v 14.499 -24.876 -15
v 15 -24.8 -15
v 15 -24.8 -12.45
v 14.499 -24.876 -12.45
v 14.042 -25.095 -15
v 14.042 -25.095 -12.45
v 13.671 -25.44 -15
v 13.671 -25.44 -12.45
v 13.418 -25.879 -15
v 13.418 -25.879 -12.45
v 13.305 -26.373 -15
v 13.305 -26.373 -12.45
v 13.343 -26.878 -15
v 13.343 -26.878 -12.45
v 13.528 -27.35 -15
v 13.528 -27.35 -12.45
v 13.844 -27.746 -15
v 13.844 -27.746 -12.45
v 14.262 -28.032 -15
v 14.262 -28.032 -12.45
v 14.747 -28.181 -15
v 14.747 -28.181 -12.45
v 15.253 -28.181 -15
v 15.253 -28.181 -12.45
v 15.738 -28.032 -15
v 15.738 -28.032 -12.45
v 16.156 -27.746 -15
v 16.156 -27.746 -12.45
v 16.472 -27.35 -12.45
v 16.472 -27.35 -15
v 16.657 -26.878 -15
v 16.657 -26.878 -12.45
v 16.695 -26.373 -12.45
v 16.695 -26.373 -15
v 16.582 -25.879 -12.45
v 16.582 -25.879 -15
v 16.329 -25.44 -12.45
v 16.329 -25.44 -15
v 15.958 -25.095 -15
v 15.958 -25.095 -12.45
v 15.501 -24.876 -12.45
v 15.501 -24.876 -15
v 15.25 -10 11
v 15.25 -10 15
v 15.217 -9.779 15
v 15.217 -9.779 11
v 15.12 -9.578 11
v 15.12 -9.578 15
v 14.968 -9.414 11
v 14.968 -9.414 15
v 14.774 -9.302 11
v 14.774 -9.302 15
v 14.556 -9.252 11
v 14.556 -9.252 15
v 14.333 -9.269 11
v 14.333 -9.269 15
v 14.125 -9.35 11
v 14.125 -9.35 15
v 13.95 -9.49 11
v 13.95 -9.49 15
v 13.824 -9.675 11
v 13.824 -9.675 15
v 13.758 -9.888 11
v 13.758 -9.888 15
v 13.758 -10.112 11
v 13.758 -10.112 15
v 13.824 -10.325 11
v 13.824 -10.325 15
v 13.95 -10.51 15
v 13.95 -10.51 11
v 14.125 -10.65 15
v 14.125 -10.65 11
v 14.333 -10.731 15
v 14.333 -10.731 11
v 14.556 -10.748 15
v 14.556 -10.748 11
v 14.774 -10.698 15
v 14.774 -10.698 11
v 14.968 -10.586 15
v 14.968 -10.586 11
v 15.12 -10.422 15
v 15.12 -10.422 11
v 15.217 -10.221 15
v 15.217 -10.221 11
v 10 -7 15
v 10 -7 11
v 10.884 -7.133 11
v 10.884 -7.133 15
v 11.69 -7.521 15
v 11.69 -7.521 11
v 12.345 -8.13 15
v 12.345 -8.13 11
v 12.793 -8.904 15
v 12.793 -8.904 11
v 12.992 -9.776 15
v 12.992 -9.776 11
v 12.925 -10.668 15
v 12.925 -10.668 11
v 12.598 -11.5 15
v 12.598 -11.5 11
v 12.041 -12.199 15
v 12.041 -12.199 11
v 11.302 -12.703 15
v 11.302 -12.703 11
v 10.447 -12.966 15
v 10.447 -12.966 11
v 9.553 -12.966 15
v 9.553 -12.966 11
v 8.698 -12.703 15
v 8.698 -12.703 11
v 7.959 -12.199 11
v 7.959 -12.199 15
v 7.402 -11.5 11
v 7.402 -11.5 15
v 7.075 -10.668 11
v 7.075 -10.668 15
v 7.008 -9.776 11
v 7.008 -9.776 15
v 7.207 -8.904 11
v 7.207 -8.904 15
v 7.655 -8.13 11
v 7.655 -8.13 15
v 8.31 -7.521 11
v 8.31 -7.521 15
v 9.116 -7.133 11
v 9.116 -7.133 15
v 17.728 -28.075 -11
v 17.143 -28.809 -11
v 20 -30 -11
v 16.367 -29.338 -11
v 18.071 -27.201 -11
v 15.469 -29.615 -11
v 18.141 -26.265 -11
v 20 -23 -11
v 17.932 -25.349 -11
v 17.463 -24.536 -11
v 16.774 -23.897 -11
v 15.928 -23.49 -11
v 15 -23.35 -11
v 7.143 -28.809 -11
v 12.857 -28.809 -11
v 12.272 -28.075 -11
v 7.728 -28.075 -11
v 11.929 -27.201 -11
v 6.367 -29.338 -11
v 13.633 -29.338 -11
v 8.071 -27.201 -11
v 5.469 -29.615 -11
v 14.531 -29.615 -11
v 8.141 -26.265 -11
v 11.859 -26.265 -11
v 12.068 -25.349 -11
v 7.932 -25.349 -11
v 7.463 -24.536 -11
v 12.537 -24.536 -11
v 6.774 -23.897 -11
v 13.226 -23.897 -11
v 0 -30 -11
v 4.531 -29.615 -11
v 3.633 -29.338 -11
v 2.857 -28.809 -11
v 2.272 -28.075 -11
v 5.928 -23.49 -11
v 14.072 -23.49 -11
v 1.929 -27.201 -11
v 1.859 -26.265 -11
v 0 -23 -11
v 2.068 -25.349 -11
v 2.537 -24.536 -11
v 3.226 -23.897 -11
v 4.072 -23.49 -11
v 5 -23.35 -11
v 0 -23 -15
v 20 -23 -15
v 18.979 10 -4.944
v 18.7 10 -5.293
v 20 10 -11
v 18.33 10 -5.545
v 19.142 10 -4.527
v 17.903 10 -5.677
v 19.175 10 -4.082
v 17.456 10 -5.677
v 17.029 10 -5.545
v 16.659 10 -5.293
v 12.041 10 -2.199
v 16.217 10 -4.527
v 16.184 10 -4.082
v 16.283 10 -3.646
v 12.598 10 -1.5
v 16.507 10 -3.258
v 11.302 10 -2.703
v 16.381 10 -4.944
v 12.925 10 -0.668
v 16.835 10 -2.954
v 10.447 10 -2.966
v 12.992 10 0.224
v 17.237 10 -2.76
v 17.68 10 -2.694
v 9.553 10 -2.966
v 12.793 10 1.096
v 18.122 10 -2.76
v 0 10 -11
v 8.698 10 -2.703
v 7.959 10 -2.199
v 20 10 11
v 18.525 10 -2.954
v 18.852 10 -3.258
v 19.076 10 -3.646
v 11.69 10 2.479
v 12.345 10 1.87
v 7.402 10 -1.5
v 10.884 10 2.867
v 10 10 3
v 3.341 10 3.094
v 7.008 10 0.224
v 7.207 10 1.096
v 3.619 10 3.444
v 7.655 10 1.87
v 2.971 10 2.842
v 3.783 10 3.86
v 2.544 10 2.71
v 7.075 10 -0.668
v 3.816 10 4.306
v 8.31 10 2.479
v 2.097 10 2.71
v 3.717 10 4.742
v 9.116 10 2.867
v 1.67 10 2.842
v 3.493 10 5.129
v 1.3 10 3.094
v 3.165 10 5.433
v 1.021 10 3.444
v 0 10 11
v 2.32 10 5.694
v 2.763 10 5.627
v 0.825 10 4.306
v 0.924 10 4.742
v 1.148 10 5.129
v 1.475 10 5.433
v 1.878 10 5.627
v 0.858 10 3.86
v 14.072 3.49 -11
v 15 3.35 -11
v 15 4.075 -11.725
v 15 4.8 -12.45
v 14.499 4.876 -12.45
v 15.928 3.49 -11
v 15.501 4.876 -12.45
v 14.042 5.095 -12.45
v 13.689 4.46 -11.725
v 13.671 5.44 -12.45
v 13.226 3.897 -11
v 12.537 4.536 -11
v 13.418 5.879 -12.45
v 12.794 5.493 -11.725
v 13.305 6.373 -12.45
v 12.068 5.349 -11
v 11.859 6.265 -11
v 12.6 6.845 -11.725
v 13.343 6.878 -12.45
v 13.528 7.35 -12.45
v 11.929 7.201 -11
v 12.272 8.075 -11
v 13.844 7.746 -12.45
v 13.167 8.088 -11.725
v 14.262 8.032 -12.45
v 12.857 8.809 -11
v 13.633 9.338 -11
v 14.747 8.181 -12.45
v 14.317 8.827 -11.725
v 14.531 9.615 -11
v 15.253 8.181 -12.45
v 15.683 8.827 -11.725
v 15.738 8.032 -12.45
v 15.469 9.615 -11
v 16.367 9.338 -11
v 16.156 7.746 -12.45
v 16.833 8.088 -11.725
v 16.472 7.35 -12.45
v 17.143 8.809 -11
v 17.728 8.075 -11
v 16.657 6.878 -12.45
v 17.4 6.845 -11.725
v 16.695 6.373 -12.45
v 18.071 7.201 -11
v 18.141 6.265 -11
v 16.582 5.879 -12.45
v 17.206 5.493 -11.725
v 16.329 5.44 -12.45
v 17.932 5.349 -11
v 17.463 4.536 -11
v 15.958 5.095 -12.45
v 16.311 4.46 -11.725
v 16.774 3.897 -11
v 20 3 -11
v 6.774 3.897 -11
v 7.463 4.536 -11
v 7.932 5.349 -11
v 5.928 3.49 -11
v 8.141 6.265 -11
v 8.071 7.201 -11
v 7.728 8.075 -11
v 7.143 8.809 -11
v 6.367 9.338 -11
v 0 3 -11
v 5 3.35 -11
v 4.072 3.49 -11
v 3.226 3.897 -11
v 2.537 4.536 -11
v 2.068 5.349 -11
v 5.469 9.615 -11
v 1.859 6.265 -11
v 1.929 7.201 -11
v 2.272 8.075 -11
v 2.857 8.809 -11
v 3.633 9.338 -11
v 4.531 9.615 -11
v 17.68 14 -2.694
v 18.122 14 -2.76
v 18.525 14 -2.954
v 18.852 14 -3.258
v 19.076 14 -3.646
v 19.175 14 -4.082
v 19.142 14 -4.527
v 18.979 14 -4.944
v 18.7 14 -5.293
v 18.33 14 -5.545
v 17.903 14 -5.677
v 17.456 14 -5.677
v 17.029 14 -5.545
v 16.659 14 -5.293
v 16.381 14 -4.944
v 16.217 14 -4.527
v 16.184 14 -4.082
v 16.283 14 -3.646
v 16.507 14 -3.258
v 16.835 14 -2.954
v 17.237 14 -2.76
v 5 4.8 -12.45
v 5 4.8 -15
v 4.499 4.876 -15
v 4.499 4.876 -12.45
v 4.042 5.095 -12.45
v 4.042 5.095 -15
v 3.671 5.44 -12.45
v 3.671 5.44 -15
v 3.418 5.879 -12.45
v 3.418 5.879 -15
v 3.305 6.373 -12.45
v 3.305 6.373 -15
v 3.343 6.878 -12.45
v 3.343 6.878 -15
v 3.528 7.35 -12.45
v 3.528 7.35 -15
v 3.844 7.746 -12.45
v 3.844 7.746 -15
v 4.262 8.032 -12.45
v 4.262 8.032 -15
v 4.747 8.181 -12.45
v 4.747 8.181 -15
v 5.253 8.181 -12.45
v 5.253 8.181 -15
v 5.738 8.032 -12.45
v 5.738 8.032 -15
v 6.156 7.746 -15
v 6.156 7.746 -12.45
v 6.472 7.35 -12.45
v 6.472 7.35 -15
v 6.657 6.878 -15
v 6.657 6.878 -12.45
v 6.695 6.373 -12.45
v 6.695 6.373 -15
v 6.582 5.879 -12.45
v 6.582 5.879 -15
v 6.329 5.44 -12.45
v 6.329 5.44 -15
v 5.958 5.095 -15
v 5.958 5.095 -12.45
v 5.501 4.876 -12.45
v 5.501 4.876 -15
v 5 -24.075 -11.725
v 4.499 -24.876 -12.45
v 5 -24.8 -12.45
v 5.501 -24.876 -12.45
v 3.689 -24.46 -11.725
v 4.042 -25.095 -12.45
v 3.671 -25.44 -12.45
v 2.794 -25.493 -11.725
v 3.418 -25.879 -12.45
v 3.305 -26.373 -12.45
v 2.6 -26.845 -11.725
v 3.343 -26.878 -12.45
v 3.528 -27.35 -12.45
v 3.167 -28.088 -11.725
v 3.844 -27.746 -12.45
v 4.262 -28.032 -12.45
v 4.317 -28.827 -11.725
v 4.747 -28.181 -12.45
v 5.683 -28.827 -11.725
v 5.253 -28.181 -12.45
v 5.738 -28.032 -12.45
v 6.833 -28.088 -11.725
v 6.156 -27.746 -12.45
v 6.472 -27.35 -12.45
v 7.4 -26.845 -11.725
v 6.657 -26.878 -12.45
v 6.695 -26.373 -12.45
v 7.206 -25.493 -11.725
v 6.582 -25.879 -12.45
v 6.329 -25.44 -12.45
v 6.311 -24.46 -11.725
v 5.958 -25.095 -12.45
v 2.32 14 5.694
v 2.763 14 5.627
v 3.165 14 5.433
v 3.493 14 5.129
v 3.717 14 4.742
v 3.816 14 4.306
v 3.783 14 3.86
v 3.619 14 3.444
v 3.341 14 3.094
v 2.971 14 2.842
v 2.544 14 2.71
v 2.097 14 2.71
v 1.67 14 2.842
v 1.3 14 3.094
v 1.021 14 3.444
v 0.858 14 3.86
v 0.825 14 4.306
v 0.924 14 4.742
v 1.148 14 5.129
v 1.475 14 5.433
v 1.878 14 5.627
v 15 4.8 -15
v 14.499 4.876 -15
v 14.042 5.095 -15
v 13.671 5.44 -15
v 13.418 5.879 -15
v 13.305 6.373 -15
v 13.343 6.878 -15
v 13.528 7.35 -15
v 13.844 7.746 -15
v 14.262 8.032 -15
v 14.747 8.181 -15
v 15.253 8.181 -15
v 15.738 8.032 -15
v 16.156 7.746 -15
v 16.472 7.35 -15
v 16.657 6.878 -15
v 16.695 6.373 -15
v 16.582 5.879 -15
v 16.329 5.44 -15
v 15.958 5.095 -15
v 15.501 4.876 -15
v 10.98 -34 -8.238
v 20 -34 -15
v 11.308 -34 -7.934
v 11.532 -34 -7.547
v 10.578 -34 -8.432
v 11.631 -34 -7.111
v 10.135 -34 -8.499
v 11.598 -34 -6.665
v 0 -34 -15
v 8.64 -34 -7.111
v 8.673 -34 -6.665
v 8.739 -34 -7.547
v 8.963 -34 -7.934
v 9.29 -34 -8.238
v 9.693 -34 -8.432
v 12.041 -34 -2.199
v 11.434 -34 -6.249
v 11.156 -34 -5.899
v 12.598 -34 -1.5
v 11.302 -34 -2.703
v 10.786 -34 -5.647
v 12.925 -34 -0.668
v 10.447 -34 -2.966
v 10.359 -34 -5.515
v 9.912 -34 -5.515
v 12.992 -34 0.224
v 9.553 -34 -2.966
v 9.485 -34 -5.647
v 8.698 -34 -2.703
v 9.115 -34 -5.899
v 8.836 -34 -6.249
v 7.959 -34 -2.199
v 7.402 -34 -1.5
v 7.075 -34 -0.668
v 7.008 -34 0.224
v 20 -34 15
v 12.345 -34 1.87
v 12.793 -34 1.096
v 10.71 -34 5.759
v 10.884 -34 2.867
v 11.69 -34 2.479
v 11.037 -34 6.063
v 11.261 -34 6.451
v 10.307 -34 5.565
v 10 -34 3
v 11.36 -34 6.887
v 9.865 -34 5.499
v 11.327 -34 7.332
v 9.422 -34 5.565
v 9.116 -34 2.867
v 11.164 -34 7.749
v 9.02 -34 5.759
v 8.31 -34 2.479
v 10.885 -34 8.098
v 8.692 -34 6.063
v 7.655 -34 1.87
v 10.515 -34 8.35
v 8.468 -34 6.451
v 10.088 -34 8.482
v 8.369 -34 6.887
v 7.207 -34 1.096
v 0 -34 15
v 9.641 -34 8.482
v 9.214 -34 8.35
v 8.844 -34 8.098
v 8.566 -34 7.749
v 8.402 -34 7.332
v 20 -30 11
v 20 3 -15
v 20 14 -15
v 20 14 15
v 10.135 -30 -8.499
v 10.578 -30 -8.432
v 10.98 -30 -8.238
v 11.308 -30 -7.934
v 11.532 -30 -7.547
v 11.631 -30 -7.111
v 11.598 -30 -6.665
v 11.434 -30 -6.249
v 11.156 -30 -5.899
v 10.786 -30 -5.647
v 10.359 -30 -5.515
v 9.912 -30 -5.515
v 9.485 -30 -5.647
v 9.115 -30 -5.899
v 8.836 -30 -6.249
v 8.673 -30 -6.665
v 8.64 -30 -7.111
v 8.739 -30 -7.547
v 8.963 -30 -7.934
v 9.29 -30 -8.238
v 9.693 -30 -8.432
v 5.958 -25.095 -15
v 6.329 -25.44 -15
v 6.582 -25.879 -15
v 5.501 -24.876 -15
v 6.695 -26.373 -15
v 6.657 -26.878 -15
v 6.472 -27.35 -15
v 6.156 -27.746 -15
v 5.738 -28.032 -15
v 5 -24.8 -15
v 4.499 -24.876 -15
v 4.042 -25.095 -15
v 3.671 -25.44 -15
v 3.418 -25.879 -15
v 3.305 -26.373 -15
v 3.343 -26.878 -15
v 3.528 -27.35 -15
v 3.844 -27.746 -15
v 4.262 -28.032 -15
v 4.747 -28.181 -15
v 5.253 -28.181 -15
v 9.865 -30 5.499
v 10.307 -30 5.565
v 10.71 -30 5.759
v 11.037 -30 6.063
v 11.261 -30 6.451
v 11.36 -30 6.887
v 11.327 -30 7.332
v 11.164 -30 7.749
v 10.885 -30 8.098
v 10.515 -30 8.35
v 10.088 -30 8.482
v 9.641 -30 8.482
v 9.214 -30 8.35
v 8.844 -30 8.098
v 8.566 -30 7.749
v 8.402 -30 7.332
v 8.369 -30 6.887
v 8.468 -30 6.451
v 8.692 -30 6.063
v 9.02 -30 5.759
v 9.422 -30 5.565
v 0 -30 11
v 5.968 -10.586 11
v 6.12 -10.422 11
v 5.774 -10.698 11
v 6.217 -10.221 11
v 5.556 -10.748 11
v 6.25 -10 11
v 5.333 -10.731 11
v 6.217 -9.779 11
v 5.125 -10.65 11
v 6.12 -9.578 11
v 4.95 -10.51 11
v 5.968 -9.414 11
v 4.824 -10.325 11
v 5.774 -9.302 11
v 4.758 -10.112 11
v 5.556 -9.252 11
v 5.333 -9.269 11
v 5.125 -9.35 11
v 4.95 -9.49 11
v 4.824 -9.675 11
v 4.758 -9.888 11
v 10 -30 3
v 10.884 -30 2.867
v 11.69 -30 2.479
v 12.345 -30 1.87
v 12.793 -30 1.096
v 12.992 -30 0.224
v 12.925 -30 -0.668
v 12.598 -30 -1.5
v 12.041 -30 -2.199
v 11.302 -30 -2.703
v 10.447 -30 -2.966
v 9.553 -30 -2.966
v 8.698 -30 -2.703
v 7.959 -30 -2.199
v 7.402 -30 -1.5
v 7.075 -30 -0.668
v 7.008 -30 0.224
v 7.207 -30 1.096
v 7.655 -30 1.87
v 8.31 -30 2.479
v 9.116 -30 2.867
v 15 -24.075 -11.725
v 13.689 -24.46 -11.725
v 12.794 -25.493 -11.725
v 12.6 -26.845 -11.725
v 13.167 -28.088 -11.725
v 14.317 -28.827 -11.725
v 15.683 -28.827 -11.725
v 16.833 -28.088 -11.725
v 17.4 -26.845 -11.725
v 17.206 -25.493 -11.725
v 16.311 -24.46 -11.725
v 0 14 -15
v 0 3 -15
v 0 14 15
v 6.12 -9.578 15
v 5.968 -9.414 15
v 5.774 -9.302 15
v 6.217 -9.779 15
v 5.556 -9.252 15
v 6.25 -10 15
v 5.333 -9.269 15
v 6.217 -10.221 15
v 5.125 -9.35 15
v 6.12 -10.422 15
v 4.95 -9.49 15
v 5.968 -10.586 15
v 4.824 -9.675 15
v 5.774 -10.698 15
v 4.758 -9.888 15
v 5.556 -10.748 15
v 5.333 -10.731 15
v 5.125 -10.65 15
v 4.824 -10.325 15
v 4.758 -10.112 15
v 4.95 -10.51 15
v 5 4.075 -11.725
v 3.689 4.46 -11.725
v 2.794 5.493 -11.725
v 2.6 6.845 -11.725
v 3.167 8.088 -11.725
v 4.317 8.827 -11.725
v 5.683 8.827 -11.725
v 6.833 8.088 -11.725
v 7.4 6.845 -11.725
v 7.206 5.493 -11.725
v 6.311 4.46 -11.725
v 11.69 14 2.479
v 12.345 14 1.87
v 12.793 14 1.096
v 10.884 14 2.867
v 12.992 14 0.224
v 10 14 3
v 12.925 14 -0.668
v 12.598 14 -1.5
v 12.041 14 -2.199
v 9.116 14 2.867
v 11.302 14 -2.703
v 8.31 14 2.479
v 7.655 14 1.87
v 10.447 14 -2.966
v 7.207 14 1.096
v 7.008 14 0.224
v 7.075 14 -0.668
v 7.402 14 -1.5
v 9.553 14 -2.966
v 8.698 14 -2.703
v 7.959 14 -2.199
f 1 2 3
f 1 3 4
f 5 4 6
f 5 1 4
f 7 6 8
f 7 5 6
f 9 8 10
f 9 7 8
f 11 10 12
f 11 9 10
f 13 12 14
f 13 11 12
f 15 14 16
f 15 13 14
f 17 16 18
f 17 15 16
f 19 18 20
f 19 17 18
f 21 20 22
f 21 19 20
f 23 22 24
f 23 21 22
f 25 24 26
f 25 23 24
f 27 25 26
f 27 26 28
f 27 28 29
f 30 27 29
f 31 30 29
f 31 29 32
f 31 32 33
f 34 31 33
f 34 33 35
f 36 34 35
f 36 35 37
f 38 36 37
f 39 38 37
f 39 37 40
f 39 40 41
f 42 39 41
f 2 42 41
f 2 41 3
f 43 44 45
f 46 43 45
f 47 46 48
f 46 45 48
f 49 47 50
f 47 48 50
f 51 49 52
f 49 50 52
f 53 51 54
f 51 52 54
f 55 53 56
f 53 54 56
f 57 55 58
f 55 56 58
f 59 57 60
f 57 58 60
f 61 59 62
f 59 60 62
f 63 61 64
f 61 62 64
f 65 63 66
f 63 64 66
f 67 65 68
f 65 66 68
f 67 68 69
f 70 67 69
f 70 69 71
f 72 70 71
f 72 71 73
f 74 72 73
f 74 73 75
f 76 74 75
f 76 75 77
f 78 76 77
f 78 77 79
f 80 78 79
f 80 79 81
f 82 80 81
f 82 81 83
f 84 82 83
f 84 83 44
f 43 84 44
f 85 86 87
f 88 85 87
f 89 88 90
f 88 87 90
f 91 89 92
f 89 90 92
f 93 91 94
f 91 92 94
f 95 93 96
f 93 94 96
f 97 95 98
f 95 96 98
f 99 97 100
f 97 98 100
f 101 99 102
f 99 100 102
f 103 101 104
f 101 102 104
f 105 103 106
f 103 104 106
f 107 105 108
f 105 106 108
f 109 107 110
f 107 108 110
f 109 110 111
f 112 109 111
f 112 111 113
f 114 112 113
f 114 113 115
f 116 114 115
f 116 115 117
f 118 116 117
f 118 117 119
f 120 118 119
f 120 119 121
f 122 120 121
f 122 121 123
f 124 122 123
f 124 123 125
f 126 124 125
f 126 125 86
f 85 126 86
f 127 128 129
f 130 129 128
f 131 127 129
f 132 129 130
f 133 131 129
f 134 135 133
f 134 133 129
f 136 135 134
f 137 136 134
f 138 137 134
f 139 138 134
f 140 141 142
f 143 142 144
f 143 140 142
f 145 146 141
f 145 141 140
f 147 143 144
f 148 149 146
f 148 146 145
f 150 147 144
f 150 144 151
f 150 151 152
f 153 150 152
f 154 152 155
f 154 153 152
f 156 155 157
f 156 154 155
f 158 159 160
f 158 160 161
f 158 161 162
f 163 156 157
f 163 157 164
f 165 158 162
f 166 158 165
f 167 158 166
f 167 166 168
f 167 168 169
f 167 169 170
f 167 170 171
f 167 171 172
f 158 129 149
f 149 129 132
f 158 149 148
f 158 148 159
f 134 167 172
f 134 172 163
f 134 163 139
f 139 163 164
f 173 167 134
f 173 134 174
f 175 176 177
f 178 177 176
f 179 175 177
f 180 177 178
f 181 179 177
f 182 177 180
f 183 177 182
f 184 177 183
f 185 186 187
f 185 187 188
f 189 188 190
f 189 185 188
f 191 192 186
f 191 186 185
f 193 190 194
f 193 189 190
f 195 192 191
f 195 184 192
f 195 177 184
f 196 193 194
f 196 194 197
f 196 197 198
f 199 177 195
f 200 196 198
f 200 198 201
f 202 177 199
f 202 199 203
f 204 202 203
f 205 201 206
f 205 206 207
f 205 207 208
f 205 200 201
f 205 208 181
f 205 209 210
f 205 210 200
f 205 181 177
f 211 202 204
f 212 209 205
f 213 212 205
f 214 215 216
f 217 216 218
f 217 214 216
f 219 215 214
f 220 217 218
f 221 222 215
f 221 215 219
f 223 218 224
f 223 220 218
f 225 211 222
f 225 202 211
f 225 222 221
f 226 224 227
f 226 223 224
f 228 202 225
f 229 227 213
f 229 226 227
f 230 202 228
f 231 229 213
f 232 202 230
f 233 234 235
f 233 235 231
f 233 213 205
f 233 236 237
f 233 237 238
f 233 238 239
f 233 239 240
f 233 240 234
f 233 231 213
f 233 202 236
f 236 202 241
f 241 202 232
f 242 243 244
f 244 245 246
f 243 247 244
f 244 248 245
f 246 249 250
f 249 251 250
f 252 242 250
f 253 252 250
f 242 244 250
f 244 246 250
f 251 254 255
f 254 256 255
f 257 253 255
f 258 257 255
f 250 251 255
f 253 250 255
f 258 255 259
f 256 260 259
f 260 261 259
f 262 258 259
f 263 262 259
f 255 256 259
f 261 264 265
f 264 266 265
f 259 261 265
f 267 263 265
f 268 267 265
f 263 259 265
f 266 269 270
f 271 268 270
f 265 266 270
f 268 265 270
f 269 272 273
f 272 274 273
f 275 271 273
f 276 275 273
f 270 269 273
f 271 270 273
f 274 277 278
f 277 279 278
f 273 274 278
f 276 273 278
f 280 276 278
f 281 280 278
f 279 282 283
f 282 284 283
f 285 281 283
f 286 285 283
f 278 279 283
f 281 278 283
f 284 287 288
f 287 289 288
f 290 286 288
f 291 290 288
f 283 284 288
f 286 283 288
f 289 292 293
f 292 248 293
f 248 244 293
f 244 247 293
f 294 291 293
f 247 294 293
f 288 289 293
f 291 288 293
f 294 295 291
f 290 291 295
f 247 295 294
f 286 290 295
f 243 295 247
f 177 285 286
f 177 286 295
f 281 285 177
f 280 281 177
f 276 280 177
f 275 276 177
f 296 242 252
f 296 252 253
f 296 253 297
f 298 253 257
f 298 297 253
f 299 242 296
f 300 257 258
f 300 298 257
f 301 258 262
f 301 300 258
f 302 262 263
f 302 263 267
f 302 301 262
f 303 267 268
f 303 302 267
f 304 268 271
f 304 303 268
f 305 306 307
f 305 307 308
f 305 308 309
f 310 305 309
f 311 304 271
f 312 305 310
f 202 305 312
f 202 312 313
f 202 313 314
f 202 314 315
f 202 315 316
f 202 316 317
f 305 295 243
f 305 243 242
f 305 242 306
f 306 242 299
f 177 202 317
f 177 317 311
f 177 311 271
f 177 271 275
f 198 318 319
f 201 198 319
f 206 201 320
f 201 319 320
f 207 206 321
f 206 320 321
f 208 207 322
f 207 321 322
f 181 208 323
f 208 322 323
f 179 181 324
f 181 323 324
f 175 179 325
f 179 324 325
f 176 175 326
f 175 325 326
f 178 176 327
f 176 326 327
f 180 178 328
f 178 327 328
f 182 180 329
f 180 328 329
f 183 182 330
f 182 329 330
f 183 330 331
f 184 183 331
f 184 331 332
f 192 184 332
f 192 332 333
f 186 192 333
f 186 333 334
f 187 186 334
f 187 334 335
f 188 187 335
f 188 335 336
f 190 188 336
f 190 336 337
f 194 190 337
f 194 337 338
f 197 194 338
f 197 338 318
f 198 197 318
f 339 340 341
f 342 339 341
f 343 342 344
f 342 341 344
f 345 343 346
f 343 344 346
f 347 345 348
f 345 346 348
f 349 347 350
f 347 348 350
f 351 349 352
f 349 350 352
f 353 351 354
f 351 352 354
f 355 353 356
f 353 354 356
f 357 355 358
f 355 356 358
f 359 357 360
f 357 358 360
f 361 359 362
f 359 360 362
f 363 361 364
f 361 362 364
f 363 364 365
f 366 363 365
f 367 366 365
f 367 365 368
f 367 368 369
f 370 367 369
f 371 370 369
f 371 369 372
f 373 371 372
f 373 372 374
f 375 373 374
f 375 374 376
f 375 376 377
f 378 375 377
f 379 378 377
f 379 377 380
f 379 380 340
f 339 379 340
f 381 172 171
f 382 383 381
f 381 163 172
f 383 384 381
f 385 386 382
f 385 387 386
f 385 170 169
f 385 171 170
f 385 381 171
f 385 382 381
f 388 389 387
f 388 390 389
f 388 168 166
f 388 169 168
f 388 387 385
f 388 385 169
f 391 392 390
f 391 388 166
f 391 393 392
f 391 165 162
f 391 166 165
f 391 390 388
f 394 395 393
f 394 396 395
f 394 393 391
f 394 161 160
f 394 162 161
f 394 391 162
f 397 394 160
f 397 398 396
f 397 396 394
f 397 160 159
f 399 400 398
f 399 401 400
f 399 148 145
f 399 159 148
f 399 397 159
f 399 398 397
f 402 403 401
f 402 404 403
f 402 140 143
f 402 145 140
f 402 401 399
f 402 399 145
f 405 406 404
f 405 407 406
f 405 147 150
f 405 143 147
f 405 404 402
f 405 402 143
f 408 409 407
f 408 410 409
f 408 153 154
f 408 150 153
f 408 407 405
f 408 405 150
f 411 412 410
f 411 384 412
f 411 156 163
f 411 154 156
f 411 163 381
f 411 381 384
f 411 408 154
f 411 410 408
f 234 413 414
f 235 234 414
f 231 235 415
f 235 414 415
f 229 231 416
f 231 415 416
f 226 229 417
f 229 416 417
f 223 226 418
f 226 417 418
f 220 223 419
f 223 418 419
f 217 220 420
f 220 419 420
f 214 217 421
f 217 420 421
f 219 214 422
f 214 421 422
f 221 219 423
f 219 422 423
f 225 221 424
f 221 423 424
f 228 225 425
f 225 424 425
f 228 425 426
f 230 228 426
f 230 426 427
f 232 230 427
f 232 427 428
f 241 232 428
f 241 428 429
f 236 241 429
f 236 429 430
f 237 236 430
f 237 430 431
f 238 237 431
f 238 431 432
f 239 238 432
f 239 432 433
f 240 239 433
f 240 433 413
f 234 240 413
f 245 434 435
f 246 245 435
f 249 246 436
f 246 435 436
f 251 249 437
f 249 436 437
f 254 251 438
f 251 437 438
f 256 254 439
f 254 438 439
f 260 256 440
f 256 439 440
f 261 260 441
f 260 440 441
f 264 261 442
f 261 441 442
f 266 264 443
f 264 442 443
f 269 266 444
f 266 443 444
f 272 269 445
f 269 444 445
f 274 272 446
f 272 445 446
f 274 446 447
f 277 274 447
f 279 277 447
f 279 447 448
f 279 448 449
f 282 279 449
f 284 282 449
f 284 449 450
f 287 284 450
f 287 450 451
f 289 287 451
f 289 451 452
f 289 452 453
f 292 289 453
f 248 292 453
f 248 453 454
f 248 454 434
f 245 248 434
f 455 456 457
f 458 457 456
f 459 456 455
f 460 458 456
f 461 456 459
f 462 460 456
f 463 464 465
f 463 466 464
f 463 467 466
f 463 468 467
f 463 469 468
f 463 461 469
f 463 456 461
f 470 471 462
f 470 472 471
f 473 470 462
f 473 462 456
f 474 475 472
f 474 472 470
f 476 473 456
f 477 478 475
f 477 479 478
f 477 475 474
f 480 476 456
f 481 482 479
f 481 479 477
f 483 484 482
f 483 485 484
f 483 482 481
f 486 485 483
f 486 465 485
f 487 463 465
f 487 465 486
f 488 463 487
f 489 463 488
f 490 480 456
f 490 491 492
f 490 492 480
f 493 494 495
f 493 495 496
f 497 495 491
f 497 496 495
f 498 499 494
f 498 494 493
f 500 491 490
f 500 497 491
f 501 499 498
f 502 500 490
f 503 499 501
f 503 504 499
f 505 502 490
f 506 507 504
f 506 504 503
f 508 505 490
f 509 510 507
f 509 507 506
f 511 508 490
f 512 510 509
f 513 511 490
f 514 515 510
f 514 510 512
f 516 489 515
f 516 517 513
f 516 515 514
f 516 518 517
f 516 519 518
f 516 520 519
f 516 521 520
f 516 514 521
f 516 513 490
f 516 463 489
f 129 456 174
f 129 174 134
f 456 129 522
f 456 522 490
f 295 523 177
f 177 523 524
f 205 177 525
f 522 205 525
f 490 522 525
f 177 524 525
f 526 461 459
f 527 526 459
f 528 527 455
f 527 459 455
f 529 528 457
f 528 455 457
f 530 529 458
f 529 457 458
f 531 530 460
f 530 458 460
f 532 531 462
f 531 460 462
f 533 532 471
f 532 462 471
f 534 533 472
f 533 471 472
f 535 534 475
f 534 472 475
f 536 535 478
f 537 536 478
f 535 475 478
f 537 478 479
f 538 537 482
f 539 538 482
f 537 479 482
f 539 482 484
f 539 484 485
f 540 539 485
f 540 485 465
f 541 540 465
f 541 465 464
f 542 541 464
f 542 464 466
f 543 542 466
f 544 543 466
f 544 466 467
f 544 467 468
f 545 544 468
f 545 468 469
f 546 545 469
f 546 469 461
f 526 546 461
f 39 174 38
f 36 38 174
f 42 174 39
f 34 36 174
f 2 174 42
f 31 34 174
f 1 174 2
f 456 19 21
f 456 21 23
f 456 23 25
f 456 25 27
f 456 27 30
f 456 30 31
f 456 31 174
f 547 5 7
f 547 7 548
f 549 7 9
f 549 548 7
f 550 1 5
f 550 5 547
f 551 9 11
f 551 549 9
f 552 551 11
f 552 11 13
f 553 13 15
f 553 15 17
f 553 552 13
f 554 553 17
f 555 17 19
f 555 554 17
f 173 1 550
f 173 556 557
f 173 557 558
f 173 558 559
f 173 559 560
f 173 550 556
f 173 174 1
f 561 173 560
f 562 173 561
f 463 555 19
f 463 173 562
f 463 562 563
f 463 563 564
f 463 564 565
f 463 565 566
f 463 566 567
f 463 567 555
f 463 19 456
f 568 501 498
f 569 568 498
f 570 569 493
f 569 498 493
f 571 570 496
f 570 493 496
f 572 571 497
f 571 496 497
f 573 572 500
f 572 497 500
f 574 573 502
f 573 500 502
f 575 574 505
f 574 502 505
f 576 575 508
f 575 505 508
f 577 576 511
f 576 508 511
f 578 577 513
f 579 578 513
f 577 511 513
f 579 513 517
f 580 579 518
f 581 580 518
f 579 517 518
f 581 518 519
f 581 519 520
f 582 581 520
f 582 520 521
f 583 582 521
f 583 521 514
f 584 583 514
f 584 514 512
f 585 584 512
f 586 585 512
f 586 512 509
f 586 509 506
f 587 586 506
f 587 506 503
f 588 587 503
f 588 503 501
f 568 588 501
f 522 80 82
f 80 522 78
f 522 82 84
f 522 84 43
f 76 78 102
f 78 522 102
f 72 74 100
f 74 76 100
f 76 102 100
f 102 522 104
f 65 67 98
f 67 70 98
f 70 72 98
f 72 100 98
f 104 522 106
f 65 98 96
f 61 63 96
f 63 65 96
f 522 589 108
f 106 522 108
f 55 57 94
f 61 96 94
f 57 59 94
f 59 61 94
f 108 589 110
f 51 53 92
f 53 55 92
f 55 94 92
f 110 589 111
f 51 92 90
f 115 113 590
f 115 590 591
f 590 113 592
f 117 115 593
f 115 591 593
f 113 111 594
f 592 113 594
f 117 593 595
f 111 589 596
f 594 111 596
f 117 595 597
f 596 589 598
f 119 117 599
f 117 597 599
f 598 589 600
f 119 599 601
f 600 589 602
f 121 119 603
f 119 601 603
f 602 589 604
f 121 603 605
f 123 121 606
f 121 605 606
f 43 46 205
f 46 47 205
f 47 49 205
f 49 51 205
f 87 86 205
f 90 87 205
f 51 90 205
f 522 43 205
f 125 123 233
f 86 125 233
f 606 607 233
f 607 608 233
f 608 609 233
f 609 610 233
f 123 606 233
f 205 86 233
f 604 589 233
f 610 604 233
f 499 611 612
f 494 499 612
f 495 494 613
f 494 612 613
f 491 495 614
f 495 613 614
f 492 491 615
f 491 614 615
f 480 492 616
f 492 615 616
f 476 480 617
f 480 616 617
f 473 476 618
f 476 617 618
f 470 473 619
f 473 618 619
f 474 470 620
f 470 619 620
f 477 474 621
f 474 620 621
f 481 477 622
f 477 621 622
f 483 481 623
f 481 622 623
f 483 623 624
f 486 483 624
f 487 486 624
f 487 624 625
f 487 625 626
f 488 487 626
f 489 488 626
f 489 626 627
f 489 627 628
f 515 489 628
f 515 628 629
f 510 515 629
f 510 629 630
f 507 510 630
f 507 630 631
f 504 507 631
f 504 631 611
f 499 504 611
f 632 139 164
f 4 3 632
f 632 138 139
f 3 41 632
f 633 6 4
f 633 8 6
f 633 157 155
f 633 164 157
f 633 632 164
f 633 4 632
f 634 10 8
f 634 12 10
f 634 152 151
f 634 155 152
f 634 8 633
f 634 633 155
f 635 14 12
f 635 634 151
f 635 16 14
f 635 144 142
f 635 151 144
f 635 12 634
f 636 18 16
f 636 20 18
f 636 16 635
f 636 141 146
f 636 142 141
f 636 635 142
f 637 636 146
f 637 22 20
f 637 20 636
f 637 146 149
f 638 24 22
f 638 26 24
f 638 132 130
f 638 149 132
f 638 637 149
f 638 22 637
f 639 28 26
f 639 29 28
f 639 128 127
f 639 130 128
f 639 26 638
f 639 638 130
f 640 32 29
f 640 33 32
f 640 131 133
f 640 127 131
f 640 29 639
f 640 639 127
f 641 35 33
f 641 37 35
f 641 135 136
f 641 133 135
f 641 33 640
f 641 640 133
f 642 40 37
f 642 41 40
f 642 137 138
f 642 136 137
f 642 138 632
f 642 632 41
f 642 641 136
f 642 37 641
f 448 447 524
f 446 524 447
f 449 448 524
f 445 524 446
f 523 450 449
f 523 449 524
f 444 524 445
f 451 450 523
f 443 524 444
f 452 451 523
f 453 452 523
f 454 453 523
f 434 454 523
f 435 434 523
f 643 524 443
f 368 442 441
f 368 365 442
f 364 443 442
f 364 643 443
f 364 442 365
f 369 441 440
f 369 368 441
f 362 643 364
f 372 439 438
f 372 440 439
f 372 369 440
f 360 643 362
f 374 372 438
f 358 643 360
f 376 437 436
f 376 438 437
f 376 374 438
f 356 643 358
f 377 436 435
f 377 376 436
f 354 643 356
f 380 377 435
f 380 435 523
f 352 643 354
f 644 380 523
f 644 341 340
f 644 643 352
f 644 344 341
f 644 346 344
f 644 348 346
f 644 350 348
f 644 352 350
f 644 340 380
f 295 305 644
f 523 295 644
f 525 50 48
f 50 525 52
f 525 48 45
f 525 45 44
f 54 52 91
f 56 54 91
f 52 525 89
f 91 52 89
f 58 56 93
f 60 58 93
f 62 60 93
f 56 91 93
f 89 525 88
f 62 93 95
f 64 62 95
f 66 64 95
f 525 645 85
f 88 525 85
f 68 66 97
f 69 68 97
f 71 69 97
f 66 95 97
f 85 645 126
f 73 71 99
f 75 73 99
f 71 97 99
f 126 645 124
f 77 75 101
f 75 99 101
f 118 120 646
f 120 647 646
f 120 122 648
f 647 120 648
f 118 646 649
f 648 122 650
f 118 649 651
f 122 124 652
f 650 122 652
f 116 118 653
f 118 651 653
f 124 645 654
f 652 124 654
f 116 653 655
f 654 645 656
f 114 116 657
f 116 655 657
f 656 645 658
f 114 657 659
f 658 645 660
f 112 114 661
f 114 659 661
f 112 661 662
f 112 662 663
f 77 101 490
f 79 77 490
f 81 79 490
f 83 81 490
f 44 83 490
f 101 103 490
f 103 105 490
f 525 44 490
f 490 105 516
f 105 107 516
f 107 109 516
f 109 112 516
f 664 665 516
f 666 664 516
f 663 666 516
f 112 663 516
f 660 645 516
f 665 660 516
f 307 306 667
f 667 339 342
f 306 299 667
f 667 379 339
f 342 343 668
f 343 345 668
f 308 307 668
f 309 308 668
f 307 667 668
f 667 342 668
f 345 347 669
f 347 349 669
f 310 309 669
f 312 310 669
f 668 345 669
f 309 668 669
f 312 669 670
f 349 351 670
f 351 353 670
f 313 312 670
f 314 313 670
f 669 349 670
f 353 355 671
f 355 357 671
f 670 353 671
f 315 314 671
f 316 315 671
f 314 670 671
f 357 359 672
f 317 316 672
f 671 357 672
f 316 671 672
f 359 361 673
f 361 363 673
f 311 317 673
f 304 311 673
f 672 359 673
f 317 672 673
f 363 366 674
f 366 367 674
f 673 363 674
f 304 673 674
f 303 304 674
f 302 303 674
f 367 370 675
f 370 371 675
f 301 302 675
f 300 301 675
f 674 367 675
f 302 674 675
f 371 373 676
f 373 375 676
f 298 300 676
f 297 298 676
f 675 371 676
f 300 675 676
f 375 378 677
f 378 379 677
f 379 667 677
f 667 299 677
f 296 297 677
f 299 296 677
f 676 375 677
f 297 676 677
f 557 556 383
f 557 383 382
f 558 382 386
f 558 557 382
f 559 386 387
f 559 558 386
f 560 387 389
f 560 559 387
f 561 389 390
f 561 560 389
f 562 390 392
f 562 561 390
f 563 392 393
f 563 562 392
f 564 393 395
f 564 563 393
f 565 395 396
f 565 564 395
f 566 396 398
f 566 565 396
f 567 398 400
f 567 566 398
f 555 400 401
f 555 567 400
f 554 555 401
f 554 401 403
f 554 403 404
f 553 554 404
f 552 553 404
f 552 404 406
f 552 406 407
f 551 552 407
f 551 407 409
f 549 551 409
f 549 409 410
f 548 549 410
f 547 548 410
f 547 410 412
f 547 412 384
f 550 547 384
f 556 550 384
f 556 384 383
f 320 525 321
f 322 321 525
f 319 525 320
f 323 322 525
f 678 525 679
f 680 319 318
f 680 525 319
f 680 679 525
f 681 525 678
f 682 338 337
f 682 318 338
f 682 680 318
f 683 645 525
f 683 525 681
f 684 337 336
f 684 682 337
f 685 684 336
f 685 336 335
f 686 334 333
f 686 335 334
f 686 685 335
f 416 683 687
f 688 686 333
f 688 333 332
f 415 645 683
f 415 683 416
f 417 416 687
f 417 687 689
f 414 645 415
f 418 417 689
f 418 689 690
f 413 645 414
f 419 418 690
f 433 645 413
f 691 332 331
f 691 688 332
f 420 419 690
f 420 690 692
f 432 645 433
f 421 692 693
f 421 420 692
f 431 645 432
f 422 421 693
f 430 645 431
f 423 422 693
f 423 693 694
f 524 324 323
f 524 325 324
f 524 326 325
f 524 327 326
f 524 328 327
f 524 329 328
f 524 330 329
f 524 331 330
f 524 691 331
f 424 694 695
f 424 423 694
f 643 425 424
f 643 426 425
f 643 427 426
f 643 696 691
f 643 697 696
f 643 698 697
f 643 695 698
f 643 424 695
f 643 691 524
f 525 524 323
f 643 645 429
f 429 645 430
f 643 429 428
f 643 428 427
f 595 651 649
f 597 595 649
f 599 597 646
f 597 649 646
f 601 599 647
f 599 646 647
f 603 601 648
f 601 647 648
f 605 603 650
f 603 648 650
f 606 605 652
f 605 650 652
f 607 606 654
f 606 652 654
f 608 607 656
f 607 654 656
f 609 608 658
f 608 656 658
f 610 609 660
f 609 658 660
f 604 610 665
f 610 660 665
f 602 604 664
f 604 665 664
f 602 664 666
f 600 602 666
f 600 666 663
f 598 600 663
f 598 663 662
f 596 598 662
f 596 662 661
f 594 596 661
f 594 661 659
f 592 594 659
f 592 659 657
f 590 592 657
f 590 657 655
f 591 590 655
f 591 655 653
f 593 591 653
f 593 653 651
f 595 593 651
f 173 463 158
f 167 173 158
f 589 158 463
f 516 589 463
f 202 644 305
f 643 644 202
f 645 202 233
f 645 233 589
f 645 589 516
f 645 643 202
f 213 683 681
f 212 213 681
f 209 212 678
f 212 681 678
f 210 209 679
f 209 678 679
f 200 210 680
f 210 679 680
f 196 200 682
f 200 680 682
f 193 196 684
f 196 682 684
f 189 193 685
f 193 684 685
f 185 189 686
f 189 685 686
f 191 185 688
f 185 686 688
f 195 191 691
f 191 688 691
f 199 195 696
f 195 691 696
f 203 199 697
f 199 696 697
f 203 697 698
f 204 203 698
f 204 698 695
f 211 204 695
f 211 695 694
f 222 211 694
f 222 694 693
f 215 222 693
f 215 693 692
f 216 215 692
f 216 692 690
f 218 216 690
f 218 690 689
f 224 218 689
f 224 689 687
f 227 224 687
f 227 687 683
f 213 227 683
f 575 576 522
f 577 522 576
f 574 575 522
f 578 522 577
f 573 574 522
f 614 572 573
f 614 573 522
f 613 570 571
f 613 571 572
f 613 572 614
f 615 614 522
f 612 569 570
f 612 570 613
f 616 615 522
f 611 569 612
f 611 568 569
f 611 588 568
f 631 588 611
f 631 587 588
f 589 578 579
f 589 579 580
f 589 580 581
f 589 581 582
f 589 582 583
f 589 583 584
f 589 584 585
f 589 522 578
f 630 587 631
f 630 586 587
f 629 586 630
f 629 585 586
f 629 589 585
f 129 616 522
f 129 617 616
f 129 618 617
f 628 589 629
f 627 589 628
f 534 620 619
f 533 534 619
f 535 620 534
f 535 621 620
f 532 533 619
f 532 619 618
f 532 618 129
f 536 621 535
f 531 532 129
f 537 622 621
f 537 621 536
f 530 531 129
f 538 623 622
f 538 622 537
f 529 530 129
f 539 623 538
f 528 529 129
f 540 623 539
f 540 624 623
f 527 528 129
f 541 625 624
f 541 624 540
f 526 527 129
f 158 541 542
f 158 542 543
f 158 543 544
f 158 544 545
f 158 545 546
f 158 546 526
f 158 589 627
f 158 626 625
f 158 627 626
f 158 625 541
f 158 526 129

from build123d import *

# Parameters (mm, degrees)
BOSS_EXTRUDE1_DEPTH                             = 20
SKETCH2_R                                       = 3
CUT_EXTRUDE1_DEPTH                              = 48.244047244
SKETCH3_R                                       = 3
CUT_EXTRUDE2_DEPTH                              = 55.120236511
SKETCH4_W                                       = 4
SKETCH4_H                                       = 3
CUT_EXTRUDE3_DEPTH                              = 43.201895692
CUT_EXTRUDE4_REACH                              = 56.12
SKETCH5_R                                       = 1.5
CUT_EXTRUDE5_REACH                              = 56.12
SKETCH6_R                                       = 1.5
CUT_EXTRUDE6_REACH                              = 51.558
SKETCH7_R                                       = 1.5
CSK_FOR_M3_FLAT_HEAD_MACHINE_SCREW1_D           = 3.4
CSK_FOR_M3_FLAT_HEAD_MACHINE_SCREW1_DEPTH       = 4
CSK_FOR_M3_FLAT_HEAD_MACHINE_SCREW1_CSINK_D     = 6.3
CSK_FOR_M3_FLAT_HEAD_MACHINE_SCREW1_CSINK_ANGLE = 90
SKETCH9_R                                       = 0.75
CUT_EXTRUDE7_DEPTH                              = 50.558046773


with BuildPart() as part:
    # Sketch1 → Boss-Extrude1 (new body)
    with BuildSketch(Plane(origin=(0, 0, 0), x_dir=(0, 0, -1), z_dir=(1, 0, 0))):
        Polygon((-15, 0), (-15, 14), (15, 14), (15, 0), (11, 0), (11, 10), (-11, 10), (-11, 0), (-11, -30), (11, -30), (11, -20), (15, -20), (15, -34), (-15, -34), (-15, -20), align=None)
    extrude(amount=BOSS_EXTRUDE1_DEPTH)

    # Sketch2 → Cut-Extrude1 (cut, through all)
    with BuildSketch(Plane(origin=(0, 0, 11), x_dir=(-1, 0, 0), z_dir=(0, 0, -1))):
        with Locations(Location((-10, -10, 0), (0, 0, 90))):
            Circle(SKETCH2_R)
    extrude(amount=-CUT_EXTRUDE1_DEPTH, mode=Mode.SUBTRACT)

    # Sketch3 → Cut-Extrude2 (cut, through all)
    with BuildSketch(Plane(origin=(0, 14, 0), x_dir=(1, 0, 0), z_dir=(0, 1, 0))):
        with Locations(Location((10, 0, 0), (0, 0, 270))):
            Circle(SKETCH3_R)
    extrude(amount=-CUT_EXTRUDE2_DEPTH, mode=Mode.SUBTRACT)

    # Sketch4 → Cut-Extrude3 (cut, through all)
    with BuildSketch(Plane(origin=(20, 0, 0), x_dir=(0, 0, -1), z_dir=(1, 0, 0))):
        with Locations((13, 1.5)):
            Rectangle(SKETCH4_W, SKETCH4_H)
        with Locations((13, -21.5)):
            Rectangle(SKETCH4_W, SKETCH4_H)
    extrude(amount=-CUT_EXTRUDE3_DEPTH, mode=Mode.SUBTRACT)

    # Sketch5 → Cut-Extrude4 (cut, up to next)
    with BuildSketch(Plane.XZ.offset(34), mode=Mode.PRIVATE) as cut_extrude4_sk1:
        with Locations(Location((9.864597697, 6.998690322, 0), (0, 0, 270))):
            Circle(SKETCH5_R)
    cut_extrude4_tool1 = extrude(cut_extrude4_sk1.sketch, amount=-CUT_EXTRUDE4_REACH, mode=Mode.PRIVATE) & part.part
    # Sketch5 → Cut-Extrude4 (cut, up to next)
    with BuildSketch(Plane.XZ.offset(34), mode=Mode.PRIVATE) as cut_extrude4_sk2:
        with Locations(Location((10.135402303, -6.998690322, 0), (0, 0, 270))):
            Circle(SKETCH5_R)
    cut_extrude4_tool2 = extrude(cut_extrude4_sk2.sketch, amount=-CUT_EXTRUDE4_REACH, mode=Mode.PRIVATE) & part.part
    add(cut_extrude4_tool1.solids().sort_by_distance((9.864598, -34, 6.99869))[0], mode=Mode.SUBTRACT)
    add(cut_extrude4_tool2.solids().sort_by_distance((10.135402, -34, -6.99869))[0], mode=Mode.SUBTRACT)

    # Sketch6 → Cut-Extrude5 (cut, up to next)
    with BuildSketch(Plane(origin=(0, 14, 0), x_dir=(1, 0, 0), z_dir=(0, 1, 0)), mode=Mode.PRIVATE) as cut_extrude5_sk1:
        with Locations(Location((17.679589652, 4.193614525, 0), (0, 0, 270))):
            Circle(SKETCH6_R)
    cut_extrude5_tool1 = extrude(cut_extrude5_sk1.sketch, amount=-CUT_EXTRUDE5_REACH, mode=Mode.PRIVATE) & part.part
    # Sketch6 → Cut-Extrude5 (cut, up to next)
    with BuildSketch(Plane(origin=(0, 14, 0), x_dir=(1, 0, 0), z_dir=(0, 1, 0)), mode=Mode.PRIVATE) as cut_extrude5_sk2:
        with Locations(Location((2.320410348, -4.193614525, 0), (0, 0, 270))):
            Circle(SKETCH6_R)
    cut_extrude5_tool2 = extrude(cut_extrude5_sk2.sketch, amount=-CUT_EXTRUDE5_REACH, mode=Mode.PRIVATE) & part.part
    add(cut_extrude5_tool1.solids().sort_by_distance((17.67959, 14, -4.193615))[0], mode=Mode.SUBTRACT)
    add(cut_extrude5_tool2.solids().sort_by_distance((2.32041, 14, 4.193615))[0], mode=Mode.SUBTRACT)

    # Sketch7 → Cut-Extrude6 (cut, up to next)
    with BuildSketch(Plane(origin=(0, 0, -15), x_dir=(-1, 0, 0), z_dir=(0, 0, -1)), mode=Mode.PRIVATE) as cut_extrude6_sk1:
        with Locations((-15, 6.5)):
            Circle(SKETCH7_R)
    cut_extrude6_tool1 = extrude(cut_extrude6_sk1.sketch, amount=-CUT_EXTRUDE6_REACH, mode=Mode.PRIVATE) & part.part
    # Sketch7 → Cut-Extrude6 (cut, up to next)
    with BuildSketch(Plane(origin=(0, 0, -15), x_dir=(-1, 0, 0), z_dir=(0, 0, -1)), mode=Mode.PRIVATE) as cut_extrude6_sk2:
        with Locations((-5, 6.5)):
            Circle(SKETCH7_R)
    cut_extrude6_tool2 = extrude(cut_extrude6_sk2.sketch, amount=-CUT_EXTRUDE6_REACH, mode=Mode.PRIVATE) & part.part
    cut_extrude6_1 = cut_extrude6_tool1.solids().sort_by_distance((15, 6.5, -15))[0]
    add(cut_extrude6_1, mode=Mode.SUBTRACT)
    cut_extrude6_2 = cut_extrude6_tool2.solids().sort_by_distance((5, 6.5, -15))[0]
    add(cut_extrude6_2, mode=Mode.SUBTRACT)
    cut_extrude6 = cut_extrude6_1 + cut_extrude6_2  # Cut-Extrude6 as one shape, for the pattern or mirror that repeats it

    # CSK for M3 Flat Head Machine Screw1
    with Locations(Plane(origin=(5, 6.5, -11), x_dir=(0, 1, 0), z_dir=(0, 0, 1))):
        with Locations((0, 0), (0, -10)):
            csk_for_m3_flat_head_machine_screw1 = CounterSinkHole(CSK_FOR_M3_FLAT_HEAD_MACHINE_SCREW1_D / 2, CSK_FOR_M3_FLAT_HEAD_MACHINE_SCREW1_CSINK_D / 2, depth=CSK_FOR_M3_FLAT_HEAD_MACHINE_SCREW1_DEPTH, counter_sink_angle=CSK_FOR_M3_FLAT_HEAD_MACHINE_SCREW1_CSINK_ANGLE)

    # Mirror1: Cut-Extrude6, CSK for M3 Flat Head Machine Screw1 across plane
    add(cut_extrude6.mirror(Plane.ZX.offset(-10)), mode=Mode.SUBTRACT)
    add(csk_for_m3_flat_head_machine_screw1.mirror(Plane.ZX.offset(-10)), mode=Mode.SUBTRACT)

    # Sketch9 → Cut-Extrude7 (cut, through all)
    with BuildSketch(Plane.XY.offset(15)):
        with Locations((5.5, -10)):
            Circle(SKETCH9_R)
        with Locations((14.5, -10)):
            Circle(SKETCH9_R)
    extrude(amount=-CUT_EXTRUDE7_DEPTH, mode=Mode.SUBTRACT)


solid = part.part
